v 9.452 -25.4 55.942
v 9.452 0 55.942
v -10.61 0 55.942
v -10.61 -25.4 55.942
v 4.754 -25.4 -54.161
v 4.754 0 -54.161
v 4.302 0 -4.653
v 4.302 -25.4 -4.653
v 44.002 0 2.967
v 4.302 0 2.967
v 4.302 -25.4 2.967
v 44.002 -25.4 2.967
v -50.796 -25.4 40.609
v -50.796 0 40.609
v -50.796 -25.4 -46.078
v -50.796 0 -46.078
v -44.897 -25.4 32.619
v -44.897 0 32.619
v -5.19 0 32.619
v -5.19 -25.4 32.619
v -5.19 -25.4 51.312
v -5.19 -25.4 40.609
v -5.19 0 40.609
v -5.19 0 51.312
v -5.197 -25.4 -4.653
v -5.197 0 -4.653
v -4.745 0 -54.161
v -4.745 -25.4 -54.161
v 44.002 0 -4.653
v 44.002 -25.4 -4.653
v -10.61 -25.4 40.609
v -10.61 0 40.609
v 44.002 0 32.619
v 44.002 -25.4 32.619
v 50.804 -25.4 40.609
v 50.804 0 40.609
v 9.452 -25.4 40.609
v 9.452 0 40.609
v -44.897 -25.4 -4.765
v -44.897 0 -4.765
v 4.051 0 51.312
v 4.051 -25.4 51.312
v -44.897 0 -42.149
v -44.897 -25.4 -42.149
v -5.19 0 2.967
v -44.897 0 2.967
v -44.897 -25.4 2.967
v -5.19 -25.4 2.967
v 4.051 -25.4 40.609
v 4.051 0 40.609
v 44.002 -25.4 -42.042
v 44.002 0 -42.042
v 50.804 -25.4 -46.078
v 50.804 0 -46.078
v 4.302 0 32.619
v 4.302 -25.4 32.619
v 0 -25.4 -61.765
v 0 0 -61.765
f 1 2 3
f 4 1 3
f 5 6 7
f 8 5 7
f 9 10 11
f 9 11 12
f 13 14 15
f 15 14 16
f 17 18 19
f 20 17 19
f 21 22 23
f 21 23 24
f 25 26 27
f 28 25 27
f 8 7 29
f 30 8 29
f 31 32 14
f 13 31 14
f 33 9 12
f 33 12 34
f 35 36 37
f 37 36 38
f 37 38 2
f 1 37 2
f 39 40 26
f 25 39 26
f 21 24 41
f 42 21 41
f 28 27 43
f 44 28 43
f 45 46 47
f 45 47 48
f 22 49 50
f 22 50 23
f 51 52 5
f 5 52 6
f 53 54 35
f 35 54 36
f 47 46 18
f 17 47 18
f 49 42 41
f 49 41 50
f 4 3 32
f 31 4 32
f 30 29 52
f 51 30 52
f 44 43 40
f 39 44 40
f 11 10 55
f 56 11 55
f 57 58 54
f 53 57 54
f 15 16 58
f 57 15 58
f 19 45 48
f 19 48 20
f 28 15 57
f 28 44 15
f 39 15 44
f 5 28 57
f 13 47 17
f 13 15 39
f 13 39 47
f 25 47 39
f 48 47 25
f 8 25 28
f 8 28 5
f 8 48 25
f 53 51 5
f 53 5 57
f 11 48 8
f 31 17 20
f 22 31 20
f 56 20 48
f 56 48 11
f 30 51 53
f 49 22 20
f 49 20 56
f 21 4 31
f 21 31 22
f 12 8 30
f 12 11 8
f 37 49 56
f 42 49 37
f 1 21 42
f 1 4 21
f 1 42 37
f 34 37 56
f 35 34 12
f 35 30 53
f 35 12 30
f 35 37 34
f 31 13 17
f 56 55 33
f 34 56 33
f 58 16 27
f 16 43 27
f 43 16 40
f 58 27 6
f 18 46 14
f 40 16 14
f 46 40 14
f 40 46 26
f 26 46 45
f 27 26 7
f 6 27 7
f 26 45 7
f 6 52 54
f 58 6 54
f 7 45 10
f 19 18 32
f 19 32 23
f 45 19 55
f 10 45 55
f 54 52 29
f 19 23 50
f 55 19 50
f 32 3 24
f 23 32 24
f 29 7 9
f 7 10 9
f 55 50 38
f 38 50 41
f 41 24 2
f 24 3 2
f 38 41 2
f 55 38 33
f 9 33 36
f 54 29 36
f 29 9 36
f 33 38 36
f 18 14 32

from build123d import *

# Parameters (mm, degrees)
F0_W     = 39.707024
F0_H     = 29.651739
F0_W_2   = 39.7002
F1_DEPTH = 18.542
F2_DEPTH = 25.4


with BuildPart() as f1:
    # F0 (on Front) → F1 (new body)
    with BuildSketch(Plane.XZ):
        Polygon((-50.795936, 40.608853), (-50.795936, 0), (-50.795936, -46.078143), (0, -61.765383), (50.804064, -46.078143), (50.804064, 0), (50.804064, 40.608853), (9.452418, 40.608853), (4.051034, 40.608853), (-5.18992, 40.608853), (-10.609858, 40.608853), align=None)
        Polygon((-44.896944, -42.148899), (-44.896944, -4.764843), (-5.196902, -4.652967), (-4.745259, -54.160614), align=None, mode=Mode.SUBTRACT)
        Polygon((4.754341, -54.160614), (4.301752, -4.652967), (44.001952, -4.652967), (44.001952, -42.041767), align=None, mode=Mode.SUBTRACT)
        with Locations((-25.043432, 17.793344)):
            Rectangle(F0_W, F0_H, mode=Mode.SUBTRACT)
        with Locations((24.151852, 17.793344)):
            Rectangle(F0_W_2, F0_H, mode=Mode.SUBTRACT)
    extrude(amount=F1_DEPTH)

    # F0 (on Front) → F2 (join)
    with BuildSketch(Plane.XZ):
        Polygon((-50.795936, 40.608853), (-50.795936, 0), (-50.795936, -46.078143), (0, -61.765383), (50.804064, -46.078143), (50.804064, 0), (50.804064, 40.608853), (9.452418, 40.608853), (4.051034, 40.608853), (-5.18992, 40.608853), (-10.609858, 40.608853), align=None)
        Polygon((-44.896944, -42.148899), (-44.896944, -4.764843), (-5.196902, -4.652967), (-4.745259, -54.160614), align=None, mode=Mode.SUBTRACT)
        Polygon((4.754341, -54.160614), (4.301752, -4.652967), (44.001952, -4.652967), (44.001952, -42.041767), align=None, mode=Mode.SUBTRACT)
        with Locations((-25.043432, 17.793344)):
            Rectangle(F0_W, F0_H, mode=Mode.SUBTRACT)
        with Locations((24.151852, 17.793344)):
            Rectangle(F0_W_2, F0_H, mode=Mode.SUBTRACT)
        Polygon((-10.609858, 55.941623), (-10.609858, 40.608853), (-5.18992, 40.608853), (-5.18992, 51.311865), (4.051034, 51.311865), (4.051034, 40.608853), (9.452418, 40.608853), (9.452418, 55.941623), align=None)
    extrude(amount=F2_DEPTH)


solid = f1.part
